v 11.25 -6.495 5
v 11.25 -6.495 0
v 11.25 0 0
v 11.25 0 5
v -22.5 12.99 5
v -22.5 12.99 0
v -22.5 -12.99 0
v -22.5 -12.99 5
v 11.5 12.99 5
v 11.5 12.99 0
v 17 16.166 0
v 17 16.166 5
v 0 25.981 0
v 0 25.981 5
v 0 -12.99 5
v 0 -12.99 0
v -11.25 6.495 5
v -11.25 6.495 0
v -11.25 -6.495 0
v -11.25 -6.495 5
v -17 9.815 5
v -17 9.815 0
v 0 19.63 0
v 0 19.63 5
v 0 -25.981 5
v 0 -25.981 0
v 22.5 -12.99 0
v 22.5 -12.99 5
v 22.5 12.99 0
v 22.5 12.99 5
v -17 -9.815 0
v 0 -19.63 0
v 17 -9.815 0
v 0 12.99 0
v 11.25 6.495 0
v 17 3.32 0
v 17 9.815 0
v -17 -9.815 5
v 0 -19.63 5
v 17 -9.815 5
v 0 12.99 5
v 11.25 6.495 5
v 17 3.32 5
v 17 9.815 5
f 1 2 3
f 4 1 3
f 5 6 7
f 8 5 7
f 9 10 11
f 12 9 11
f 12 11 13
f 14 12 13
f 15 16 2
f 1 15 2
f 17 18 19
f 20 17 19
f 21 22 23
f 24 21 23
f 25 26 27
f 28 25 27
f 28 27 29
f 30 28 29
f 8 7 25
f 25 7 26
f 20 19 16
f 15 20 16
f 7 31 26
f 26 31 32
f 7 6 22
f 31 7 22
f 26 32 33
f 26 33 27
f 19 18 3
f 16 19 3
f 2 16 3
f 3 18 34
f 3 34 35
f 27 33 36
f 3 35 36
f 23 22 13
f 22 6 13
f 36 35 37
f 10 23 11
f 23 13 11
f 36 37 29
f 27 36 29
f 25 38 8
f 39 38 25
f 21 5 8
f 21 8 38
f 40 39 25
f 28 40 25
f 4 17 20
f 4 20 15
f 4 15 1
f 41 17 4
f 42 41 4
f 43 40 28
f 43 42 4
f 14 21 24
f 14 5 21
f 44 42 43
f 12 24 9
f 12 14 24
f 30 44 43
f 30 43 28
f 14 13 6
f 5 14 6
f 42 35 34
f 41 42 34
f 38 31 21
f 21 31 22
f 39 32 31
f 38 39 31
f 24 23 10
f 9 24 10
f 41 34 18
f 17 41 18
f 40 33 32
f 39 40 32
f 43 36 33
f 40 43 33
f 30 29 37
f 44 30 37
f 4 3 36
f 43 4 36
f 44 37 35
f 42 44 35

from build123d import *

# Parameters (mm, degrees)
F1_DEPTH = 5


with BuildPart() as f1:
    # F0 (on Top) → F1 (new body)
    with BuildSketch(Plane.XY):
        Polygon((-22.5, -12.990381), (0, -25.980762), (0, -19.629909), (-17, -9.814955), (-17, 9.814955), (-22.5, 12.990381), align=None)
        Polygon((11.5, 12.990381), (17, 16.165808), (0, 25.980762), (-22.5, 12.990381), (-17, 9.814955), (0, 19.629909), align=None)
        Polygon((22.5, -12.990381), (22.5, 12.990381), (17, 9.814955), (17, 3.319764), (17, -9.814955), (0, -19.629909), (0, -25.980762), align=None)
        Polygon((0, 0), (11.25, 6.495191), (0, 12.990381), (-11.25, 6.495191), align=None)
        Polygon((0, -12.990381), (0, 0), (-11.25, 6.495191), (-11.25, -6.495191), align=None)
        Polygon((11.25, 0), (11.25, 6.495191), (0, 0), (0, -12.990381), (11.25, -6.495191), align=None)
        Polygon((17, 3.319764), (17, 9.814955), (11.25, 6.495191), (11.25, 0), align=None)
    extrude(amount=F1_DEPTH)


solid = f1.part
